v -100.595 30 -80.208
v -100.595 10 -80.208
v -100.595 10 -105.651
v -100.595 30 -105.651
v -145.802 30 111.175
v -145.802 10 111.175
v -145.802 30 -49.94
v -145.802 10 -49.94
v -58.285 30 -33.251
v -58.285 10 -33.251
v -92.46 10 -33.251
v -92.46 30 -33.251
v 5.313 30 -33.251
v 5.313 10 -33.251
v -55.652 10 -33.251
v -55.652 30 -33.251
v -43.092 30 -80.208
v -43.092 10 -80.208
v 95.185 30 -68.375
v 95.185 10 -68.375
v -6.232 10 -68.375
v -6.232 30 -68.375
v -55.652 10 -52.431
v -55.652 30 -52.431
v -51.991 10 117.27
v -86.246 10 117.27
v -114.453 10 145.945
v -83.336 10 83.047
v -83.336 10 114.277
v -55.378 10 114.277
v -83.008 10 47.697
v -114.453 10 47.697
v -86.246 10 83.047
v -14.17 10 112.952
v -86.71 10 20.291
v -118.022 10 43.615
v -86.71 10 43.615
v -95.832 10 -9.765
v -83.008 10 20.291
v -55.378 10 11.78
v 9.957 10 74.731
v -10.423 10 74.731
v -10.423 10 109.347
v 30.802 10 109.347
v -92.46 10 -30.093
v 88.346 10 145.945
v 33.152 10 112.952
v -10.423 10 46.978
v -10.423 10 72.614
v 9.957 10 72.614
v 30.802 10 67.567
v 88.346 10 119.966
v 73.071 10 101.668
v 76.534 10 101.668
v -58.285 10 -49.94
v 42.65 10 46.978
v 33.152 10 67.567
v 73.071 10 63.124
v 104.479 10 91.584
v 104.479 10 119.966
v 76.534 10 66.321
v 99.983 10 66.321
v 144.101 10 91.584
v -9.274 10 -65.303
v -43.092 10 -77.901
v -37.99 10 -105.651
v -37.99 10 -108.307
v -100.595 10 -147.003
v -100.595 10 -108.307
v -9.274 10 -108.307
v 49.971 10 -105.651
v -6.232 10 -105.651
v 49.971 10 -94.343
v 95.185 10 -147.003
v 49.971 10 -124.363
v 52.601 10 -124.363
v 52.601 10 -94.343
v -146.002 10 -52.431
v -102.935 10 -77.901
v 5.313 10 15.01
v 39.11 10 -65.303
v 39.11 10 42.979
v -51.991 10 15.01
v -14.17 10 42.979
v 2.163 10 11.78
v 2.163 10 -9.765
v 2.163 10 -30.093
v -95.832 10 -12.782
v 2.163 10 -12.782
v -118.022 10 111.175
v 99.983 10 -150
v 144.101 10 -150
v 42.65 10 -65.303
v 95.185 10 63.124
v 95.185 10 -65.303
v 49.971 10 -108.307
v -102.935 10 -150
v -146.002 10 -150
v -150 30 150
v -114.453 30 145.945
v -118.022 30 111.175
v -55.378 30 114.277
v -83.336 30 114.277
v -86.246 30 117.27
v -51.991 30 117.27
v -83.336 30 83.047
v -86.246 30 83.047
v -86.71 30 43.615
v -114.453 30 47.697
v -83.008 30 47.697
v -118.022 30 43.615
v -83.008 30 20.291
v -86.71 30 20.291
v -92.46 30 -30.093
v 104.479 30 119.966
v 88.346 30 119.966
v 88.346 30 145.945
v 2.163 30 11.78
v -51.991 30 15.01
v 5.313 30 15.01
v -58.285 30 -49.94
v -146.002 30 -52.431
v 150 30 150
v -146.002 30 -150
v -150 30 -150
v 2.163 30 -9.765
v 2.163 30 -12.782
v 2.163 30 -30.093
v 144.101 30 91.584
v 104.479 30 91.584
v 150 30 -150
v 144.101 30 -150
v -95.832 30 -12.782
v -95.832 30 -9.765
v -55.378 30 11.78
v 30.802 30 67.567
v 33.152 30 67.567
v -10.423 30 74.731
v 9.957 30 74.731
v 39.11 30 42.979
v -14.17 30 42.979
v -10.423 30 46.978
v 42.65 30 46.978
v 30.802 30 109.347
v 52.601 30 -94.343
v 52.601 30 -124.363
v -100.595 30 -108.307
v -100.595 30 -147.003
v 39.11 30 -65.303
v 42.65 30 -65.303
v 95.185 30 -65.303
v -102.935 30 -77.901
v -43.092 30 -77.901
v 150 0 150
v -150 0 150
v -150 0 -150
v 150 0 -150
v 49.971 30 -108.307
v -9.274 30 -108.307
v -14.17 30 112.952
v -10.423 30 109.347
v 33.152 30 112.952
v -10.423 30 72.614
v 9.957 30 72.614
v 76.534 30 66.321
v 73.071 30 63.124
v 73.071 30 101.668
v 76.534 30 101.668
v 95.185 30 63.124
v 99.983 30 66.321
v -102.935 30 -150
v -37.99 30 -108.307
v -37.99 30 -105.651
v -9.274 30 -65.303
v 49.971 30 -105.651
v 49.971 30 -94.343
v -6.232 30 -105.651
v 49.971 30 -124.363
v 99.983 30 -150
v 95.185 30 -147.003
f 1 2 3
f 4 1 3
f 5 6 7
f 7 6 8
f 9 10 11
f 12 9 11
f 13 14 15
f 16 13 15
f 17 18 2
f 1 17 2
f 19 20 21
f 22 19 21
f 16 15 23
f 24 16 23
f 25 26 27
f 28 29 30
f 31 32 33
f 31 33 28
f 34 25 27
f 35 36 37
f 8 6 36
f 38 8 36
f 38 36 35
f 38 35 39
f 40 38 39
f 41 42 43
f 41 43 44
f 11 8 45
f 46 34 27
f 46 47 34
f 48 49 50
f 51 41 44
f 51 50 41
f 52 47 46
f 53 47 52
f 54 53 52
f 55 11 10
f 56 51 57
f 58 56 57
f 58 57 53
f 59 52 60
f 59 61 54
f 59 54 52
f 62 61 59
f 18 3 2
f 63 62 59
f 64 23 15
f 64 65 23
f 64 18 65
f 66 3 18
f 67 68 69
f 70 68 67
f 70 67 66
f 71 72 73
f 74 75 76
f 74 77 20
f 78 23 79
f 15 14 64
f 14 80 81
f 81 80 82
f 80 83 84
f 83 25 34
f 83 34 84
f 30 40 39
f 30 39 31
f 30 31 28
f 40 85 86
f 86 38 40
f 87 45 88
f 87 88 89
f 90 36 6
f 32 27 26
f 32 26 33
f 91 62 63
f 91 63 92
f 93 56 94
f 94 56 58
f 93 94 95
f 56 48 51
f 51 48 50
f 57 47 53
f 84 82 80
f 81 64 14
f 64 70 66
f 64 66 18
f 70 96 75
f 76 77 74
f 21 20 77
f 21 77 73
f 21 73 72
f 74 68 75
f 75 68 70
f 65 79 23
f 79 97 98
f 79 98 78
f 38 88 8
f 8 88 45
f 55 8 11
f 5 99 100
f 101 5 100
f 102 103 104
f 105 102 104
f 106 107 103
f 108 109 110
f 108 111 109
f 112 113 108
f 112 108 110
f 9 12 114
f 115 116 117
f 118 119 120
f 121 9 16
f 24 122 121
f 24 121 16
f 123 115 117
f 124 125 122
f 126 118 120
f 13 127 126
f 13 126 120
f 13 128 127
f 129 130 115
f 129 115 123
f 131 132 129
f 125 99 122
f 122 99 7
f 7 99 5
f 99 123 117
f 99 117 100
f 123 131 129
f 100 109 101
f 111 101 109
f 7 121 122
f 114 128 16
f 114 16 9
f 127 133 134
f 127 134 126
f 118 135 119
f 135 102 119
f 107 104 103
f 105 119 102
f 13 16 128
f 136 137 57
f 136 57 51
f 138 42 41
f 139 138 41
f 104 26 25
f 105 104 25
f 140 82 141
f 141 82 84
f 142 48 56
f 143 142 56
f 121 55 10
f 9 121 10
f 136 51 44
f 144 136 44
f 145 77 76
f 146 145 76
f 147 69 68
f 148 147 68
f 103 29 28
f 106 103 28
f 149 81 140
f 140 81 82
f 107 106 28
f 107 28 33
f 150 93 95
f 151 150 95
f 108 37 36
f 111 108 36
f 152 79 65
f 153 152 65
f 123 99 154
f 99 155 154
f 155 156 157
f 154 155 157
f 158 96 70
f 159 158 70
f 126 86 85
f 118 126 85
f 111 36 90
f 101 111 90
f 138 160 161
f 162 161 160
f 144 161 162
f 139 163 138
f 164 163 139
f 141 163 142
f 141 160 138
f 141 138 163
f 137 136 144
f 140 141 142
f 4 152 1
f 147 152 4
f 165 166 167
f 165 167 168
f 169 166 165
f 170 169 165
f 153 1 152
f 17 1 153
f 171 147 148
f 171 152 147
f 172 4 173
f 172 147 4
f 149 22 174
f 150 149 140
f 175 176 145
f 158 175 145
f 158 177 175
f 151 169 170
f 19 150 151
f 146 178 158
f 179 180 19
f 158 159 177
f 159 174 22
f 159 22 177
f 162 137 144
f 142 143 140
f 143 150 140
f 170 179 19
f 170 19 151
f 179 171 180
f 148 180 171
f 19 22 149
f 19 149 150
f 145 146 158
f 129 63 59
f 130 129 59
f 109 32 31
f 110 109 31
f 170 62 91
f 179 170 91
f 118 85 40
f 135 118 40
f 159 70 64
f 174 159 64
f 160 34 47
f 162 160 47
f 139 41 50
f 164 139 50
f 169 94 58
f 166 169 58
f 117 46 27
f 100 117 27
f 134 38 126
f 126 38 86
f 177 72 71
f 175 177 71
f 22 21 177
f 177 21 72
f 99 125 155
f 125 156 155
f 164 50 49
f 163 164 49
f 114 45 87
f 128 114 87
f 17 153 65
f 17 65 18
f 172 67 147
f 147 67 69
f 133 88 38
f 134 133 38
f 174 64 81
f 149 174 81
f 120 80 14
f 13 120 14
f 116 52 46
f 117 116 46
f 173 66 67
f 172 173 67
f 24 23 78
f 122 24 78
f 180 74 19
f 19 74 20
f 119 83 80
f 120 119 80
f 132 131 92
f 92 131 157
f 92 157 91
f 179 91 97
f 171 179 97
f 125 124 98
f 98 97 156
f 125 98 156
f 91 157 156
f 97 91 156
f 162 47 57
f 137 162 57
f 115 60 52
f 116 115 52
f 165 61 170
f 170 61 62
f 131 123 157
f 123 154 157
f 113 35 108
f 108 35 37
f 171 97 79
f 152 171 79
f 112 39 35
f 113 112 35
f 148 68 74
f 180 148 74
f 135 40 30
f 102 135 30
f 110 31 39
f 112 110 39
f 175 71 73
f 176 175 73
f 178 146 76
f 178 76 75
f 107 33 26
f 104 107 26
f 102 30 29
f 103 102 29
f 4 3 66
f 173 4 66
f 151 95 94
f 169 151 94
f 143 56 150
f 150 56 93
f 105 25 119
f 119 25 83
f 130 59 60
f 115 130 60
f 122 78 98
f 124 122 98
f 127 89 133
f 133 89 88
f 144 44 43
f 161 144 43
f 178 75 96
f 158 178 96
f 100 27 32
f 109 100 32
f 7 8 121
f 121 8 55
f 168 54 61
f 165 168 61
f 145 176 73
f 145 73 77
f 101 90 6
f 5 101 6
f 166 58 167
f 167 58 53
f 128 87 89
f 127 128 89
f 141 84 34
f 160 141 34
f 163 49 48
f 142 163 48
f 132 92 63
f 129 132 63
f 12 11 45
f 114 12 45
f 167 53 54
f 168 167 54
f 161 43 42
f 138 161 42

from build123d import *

# Parameters (mm, degrees)
SKETCH1_W           = 300
SKETCH1_H           = 300
BOSS_EXTRUDE1_DEPTH = 10
BOSS_EXTRUDE4_DEPTH = 20


with BuildPart() as part:
    # Sketch1 → Boss-Extrude1 (new body)
    with BuildSketch(Plane(origin=(0, 0, 0), x_dir=(1, 0, 0), z_dir=(0, 1, 0))):
        Rectangle(SKETCH1_W, SKETCH1_H)
    extrude(amount=BOSS_EXTRUDE1_DEPTH)

    # Sketch2 → Boss-Extrude4 (add)
    with BuildSketch(Plane(origin=(0, 10, 0), x_dir=(1, 0, 0), z_dir=(0, 1, 0))):
        Polygon((49.971374343, 108.306734699), (-9.273843692, 108.306734699), (-9.273843692, 65.302548914), (39.109683003, 65.302548914), (39.109683003, -42.978794556), (-14.169964592, -42.978794556), (-14.169964592, -112.952152785), (33.151642128, -112.952152785), (33.151642128, -67.566816692), (30.802124143, -67.566816692), (30.802124143, -109.346745837), (-10.423438765, -109.346745837), (-10.423438765, -74.73050528), (9.957336402, -74.73050528), (9.957336402, -72.613697765), (-10.423438765, -72.613697765), (-10.423438765, -46.978265259), (42.650315476, -46.978265259), (42.650315476, 65.302548914), (95.184908211, 65.302548914), (95.184908211, -63.123542137), (73.07070507, -63.123542137), (73.07070507, -101.668120527), (76.534473407, -101.668120527), (76.534473407, -66.320866756), (99.982757345, -66.320866756), (99.982757345, 150), (-102.935144351, 150), (-102.935144351, 77.901270739), (-43.092149345, 77.901270739), (-43.092149345, 80.20776174), (-100.595048935, 80.20776174), (-100.595048935, 105.650837757), (-37.989692586, 105.650837757), (-37.989692586, 108.306734699), (-100.595048935, 108.306734699), (-100.595048935, 147.003199663), (95.184908211, 147.003199663), (95.184908211, 68.375256183), (-6.232251129, 68.375256183), (-6.232251129, 105.650837757), (49.971374343, 105.650837757), (49.971374343, 94.342521139), (52.60088631, 94.342521139), (52.60088631, 124.362722745), (49.971374343, 124.362722745), align=None)
        Polygon((-146.001890411, 52.431305921), (-146.001890411, 150), (-150, 150), (-150, -150), (150, -150), (150, 150), (144.101294188, 150), (144.101294188, -91.584402299), (104.478721877, -91.584402299), (104.478721877, -119.965629386), (88.345614046, -119.965629386), (88.345614046, -145.94528604), (-114.452609493, -145.94528604), (-114.452609493, -47.69748233), (-83.008411836, -47.69748233), (-83.008411836, -20.290963527), (-86.710364357, -20.290963527), (-86.710364357, -43.614528655), (-118.021528945, -43.614528655), (-118.021528945, -111.174686517), (-145.802253378, -111.174686517), (-145.802253378, 49.940489366), (-58.285164429, 49.940489366), (-58.285164429, 33.250662457), (-92.45985442, 33.250662457), (-92.45985442, 30.093436444), (2.163221537, 30.093436444), (2.163221537, 12.78236321), (-95.832026153, 12.78236321), (-95.832026153, 9.764730819), (2.163221537, 9.764730819), (2.163221537, -11.779862869), (-55.377515494, -11.779862869), (-55.377515494, -114.277161571), (-83.335773751, -114.277161571), (-83.335773751, -83.046520825), (-86.246233134, -83.046520825), (-86.246233134, -117.269753185), (-51.991052188, -117.269753185), (-51.991052188, -15.009651935), (5.313331338, -15.009651935), (5.313331338, 33.250662457), (-55.651758488, 33.250662457), (-55.651758488, 52.431305921), align=None)
    extrude(amount=BOSS_EXTRUDE4_DEPTH)


solid = part.part
